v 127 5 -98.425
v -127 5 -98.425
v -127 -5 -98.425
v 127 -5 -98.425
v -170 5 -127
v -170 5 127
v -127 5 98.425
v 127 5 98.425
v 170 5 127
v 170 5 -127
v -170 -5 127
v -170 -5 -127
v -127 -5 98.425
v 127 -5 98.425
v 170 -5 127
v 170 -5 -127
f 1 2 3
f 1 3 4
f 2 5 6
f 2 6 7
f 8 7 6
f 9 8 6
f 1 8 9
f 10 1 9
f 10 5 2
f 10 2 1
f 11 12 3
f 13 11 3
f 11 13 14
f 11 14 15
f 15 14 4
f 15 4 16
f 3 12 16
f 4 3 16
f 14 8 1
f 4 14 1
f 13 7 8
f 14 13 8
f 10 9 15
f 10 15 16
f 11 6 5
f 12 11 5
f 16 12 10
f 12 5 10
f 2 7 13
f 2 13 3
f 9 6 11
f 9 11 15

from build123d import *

# Parameters (mm, degrees)
SKETCH1_W           = 340
SKETCH1_H           = 254
BOSS_EXTRUDE1_DEPTH = 5
CUT_EXTRUDE1_REACH  = 12
SKETCH2_W           = 254
SKETCH2_H           = 196.85


with BuildPart() as part:
    # Sketch1 → Boss-Extrude1 (new body, symmetric)
    with BuildSketch(Plane(origin=(0, 0, 0), x_dir=(1, 0, 0), z_dir=(0, 1, 0))):
        Rectangle(SKETCH1_W, SKETCH1_H)
    extrude(amount=BOSS_EXTRUDE1_DEPTH, both=True)

    # Sketch2 → Cut-Extrude1 (cut, up to next)
    with BuildSketch(Plane(origin=(0, 5, 0), x_dir=(1, 0, 0), z_dir=(0, 1, 0)), mode=Mode.PRIVATE) as cut_extrude1_sk1:
        Rectangle(SKETCH2_W, SKETCH2_H)
    cut_extrude1_tool1 = extrude(cut_extrude1_sk1.sketch, amount=-CUT_EXTRUDE1_REACH, mode=Mode.PRIVATE) & part.part
    add(cut_extrude1_tool1.solids().sort_by_distance((0, 5, 0))[0], mode=Mode.SUBTRACT)


solid = part.part
